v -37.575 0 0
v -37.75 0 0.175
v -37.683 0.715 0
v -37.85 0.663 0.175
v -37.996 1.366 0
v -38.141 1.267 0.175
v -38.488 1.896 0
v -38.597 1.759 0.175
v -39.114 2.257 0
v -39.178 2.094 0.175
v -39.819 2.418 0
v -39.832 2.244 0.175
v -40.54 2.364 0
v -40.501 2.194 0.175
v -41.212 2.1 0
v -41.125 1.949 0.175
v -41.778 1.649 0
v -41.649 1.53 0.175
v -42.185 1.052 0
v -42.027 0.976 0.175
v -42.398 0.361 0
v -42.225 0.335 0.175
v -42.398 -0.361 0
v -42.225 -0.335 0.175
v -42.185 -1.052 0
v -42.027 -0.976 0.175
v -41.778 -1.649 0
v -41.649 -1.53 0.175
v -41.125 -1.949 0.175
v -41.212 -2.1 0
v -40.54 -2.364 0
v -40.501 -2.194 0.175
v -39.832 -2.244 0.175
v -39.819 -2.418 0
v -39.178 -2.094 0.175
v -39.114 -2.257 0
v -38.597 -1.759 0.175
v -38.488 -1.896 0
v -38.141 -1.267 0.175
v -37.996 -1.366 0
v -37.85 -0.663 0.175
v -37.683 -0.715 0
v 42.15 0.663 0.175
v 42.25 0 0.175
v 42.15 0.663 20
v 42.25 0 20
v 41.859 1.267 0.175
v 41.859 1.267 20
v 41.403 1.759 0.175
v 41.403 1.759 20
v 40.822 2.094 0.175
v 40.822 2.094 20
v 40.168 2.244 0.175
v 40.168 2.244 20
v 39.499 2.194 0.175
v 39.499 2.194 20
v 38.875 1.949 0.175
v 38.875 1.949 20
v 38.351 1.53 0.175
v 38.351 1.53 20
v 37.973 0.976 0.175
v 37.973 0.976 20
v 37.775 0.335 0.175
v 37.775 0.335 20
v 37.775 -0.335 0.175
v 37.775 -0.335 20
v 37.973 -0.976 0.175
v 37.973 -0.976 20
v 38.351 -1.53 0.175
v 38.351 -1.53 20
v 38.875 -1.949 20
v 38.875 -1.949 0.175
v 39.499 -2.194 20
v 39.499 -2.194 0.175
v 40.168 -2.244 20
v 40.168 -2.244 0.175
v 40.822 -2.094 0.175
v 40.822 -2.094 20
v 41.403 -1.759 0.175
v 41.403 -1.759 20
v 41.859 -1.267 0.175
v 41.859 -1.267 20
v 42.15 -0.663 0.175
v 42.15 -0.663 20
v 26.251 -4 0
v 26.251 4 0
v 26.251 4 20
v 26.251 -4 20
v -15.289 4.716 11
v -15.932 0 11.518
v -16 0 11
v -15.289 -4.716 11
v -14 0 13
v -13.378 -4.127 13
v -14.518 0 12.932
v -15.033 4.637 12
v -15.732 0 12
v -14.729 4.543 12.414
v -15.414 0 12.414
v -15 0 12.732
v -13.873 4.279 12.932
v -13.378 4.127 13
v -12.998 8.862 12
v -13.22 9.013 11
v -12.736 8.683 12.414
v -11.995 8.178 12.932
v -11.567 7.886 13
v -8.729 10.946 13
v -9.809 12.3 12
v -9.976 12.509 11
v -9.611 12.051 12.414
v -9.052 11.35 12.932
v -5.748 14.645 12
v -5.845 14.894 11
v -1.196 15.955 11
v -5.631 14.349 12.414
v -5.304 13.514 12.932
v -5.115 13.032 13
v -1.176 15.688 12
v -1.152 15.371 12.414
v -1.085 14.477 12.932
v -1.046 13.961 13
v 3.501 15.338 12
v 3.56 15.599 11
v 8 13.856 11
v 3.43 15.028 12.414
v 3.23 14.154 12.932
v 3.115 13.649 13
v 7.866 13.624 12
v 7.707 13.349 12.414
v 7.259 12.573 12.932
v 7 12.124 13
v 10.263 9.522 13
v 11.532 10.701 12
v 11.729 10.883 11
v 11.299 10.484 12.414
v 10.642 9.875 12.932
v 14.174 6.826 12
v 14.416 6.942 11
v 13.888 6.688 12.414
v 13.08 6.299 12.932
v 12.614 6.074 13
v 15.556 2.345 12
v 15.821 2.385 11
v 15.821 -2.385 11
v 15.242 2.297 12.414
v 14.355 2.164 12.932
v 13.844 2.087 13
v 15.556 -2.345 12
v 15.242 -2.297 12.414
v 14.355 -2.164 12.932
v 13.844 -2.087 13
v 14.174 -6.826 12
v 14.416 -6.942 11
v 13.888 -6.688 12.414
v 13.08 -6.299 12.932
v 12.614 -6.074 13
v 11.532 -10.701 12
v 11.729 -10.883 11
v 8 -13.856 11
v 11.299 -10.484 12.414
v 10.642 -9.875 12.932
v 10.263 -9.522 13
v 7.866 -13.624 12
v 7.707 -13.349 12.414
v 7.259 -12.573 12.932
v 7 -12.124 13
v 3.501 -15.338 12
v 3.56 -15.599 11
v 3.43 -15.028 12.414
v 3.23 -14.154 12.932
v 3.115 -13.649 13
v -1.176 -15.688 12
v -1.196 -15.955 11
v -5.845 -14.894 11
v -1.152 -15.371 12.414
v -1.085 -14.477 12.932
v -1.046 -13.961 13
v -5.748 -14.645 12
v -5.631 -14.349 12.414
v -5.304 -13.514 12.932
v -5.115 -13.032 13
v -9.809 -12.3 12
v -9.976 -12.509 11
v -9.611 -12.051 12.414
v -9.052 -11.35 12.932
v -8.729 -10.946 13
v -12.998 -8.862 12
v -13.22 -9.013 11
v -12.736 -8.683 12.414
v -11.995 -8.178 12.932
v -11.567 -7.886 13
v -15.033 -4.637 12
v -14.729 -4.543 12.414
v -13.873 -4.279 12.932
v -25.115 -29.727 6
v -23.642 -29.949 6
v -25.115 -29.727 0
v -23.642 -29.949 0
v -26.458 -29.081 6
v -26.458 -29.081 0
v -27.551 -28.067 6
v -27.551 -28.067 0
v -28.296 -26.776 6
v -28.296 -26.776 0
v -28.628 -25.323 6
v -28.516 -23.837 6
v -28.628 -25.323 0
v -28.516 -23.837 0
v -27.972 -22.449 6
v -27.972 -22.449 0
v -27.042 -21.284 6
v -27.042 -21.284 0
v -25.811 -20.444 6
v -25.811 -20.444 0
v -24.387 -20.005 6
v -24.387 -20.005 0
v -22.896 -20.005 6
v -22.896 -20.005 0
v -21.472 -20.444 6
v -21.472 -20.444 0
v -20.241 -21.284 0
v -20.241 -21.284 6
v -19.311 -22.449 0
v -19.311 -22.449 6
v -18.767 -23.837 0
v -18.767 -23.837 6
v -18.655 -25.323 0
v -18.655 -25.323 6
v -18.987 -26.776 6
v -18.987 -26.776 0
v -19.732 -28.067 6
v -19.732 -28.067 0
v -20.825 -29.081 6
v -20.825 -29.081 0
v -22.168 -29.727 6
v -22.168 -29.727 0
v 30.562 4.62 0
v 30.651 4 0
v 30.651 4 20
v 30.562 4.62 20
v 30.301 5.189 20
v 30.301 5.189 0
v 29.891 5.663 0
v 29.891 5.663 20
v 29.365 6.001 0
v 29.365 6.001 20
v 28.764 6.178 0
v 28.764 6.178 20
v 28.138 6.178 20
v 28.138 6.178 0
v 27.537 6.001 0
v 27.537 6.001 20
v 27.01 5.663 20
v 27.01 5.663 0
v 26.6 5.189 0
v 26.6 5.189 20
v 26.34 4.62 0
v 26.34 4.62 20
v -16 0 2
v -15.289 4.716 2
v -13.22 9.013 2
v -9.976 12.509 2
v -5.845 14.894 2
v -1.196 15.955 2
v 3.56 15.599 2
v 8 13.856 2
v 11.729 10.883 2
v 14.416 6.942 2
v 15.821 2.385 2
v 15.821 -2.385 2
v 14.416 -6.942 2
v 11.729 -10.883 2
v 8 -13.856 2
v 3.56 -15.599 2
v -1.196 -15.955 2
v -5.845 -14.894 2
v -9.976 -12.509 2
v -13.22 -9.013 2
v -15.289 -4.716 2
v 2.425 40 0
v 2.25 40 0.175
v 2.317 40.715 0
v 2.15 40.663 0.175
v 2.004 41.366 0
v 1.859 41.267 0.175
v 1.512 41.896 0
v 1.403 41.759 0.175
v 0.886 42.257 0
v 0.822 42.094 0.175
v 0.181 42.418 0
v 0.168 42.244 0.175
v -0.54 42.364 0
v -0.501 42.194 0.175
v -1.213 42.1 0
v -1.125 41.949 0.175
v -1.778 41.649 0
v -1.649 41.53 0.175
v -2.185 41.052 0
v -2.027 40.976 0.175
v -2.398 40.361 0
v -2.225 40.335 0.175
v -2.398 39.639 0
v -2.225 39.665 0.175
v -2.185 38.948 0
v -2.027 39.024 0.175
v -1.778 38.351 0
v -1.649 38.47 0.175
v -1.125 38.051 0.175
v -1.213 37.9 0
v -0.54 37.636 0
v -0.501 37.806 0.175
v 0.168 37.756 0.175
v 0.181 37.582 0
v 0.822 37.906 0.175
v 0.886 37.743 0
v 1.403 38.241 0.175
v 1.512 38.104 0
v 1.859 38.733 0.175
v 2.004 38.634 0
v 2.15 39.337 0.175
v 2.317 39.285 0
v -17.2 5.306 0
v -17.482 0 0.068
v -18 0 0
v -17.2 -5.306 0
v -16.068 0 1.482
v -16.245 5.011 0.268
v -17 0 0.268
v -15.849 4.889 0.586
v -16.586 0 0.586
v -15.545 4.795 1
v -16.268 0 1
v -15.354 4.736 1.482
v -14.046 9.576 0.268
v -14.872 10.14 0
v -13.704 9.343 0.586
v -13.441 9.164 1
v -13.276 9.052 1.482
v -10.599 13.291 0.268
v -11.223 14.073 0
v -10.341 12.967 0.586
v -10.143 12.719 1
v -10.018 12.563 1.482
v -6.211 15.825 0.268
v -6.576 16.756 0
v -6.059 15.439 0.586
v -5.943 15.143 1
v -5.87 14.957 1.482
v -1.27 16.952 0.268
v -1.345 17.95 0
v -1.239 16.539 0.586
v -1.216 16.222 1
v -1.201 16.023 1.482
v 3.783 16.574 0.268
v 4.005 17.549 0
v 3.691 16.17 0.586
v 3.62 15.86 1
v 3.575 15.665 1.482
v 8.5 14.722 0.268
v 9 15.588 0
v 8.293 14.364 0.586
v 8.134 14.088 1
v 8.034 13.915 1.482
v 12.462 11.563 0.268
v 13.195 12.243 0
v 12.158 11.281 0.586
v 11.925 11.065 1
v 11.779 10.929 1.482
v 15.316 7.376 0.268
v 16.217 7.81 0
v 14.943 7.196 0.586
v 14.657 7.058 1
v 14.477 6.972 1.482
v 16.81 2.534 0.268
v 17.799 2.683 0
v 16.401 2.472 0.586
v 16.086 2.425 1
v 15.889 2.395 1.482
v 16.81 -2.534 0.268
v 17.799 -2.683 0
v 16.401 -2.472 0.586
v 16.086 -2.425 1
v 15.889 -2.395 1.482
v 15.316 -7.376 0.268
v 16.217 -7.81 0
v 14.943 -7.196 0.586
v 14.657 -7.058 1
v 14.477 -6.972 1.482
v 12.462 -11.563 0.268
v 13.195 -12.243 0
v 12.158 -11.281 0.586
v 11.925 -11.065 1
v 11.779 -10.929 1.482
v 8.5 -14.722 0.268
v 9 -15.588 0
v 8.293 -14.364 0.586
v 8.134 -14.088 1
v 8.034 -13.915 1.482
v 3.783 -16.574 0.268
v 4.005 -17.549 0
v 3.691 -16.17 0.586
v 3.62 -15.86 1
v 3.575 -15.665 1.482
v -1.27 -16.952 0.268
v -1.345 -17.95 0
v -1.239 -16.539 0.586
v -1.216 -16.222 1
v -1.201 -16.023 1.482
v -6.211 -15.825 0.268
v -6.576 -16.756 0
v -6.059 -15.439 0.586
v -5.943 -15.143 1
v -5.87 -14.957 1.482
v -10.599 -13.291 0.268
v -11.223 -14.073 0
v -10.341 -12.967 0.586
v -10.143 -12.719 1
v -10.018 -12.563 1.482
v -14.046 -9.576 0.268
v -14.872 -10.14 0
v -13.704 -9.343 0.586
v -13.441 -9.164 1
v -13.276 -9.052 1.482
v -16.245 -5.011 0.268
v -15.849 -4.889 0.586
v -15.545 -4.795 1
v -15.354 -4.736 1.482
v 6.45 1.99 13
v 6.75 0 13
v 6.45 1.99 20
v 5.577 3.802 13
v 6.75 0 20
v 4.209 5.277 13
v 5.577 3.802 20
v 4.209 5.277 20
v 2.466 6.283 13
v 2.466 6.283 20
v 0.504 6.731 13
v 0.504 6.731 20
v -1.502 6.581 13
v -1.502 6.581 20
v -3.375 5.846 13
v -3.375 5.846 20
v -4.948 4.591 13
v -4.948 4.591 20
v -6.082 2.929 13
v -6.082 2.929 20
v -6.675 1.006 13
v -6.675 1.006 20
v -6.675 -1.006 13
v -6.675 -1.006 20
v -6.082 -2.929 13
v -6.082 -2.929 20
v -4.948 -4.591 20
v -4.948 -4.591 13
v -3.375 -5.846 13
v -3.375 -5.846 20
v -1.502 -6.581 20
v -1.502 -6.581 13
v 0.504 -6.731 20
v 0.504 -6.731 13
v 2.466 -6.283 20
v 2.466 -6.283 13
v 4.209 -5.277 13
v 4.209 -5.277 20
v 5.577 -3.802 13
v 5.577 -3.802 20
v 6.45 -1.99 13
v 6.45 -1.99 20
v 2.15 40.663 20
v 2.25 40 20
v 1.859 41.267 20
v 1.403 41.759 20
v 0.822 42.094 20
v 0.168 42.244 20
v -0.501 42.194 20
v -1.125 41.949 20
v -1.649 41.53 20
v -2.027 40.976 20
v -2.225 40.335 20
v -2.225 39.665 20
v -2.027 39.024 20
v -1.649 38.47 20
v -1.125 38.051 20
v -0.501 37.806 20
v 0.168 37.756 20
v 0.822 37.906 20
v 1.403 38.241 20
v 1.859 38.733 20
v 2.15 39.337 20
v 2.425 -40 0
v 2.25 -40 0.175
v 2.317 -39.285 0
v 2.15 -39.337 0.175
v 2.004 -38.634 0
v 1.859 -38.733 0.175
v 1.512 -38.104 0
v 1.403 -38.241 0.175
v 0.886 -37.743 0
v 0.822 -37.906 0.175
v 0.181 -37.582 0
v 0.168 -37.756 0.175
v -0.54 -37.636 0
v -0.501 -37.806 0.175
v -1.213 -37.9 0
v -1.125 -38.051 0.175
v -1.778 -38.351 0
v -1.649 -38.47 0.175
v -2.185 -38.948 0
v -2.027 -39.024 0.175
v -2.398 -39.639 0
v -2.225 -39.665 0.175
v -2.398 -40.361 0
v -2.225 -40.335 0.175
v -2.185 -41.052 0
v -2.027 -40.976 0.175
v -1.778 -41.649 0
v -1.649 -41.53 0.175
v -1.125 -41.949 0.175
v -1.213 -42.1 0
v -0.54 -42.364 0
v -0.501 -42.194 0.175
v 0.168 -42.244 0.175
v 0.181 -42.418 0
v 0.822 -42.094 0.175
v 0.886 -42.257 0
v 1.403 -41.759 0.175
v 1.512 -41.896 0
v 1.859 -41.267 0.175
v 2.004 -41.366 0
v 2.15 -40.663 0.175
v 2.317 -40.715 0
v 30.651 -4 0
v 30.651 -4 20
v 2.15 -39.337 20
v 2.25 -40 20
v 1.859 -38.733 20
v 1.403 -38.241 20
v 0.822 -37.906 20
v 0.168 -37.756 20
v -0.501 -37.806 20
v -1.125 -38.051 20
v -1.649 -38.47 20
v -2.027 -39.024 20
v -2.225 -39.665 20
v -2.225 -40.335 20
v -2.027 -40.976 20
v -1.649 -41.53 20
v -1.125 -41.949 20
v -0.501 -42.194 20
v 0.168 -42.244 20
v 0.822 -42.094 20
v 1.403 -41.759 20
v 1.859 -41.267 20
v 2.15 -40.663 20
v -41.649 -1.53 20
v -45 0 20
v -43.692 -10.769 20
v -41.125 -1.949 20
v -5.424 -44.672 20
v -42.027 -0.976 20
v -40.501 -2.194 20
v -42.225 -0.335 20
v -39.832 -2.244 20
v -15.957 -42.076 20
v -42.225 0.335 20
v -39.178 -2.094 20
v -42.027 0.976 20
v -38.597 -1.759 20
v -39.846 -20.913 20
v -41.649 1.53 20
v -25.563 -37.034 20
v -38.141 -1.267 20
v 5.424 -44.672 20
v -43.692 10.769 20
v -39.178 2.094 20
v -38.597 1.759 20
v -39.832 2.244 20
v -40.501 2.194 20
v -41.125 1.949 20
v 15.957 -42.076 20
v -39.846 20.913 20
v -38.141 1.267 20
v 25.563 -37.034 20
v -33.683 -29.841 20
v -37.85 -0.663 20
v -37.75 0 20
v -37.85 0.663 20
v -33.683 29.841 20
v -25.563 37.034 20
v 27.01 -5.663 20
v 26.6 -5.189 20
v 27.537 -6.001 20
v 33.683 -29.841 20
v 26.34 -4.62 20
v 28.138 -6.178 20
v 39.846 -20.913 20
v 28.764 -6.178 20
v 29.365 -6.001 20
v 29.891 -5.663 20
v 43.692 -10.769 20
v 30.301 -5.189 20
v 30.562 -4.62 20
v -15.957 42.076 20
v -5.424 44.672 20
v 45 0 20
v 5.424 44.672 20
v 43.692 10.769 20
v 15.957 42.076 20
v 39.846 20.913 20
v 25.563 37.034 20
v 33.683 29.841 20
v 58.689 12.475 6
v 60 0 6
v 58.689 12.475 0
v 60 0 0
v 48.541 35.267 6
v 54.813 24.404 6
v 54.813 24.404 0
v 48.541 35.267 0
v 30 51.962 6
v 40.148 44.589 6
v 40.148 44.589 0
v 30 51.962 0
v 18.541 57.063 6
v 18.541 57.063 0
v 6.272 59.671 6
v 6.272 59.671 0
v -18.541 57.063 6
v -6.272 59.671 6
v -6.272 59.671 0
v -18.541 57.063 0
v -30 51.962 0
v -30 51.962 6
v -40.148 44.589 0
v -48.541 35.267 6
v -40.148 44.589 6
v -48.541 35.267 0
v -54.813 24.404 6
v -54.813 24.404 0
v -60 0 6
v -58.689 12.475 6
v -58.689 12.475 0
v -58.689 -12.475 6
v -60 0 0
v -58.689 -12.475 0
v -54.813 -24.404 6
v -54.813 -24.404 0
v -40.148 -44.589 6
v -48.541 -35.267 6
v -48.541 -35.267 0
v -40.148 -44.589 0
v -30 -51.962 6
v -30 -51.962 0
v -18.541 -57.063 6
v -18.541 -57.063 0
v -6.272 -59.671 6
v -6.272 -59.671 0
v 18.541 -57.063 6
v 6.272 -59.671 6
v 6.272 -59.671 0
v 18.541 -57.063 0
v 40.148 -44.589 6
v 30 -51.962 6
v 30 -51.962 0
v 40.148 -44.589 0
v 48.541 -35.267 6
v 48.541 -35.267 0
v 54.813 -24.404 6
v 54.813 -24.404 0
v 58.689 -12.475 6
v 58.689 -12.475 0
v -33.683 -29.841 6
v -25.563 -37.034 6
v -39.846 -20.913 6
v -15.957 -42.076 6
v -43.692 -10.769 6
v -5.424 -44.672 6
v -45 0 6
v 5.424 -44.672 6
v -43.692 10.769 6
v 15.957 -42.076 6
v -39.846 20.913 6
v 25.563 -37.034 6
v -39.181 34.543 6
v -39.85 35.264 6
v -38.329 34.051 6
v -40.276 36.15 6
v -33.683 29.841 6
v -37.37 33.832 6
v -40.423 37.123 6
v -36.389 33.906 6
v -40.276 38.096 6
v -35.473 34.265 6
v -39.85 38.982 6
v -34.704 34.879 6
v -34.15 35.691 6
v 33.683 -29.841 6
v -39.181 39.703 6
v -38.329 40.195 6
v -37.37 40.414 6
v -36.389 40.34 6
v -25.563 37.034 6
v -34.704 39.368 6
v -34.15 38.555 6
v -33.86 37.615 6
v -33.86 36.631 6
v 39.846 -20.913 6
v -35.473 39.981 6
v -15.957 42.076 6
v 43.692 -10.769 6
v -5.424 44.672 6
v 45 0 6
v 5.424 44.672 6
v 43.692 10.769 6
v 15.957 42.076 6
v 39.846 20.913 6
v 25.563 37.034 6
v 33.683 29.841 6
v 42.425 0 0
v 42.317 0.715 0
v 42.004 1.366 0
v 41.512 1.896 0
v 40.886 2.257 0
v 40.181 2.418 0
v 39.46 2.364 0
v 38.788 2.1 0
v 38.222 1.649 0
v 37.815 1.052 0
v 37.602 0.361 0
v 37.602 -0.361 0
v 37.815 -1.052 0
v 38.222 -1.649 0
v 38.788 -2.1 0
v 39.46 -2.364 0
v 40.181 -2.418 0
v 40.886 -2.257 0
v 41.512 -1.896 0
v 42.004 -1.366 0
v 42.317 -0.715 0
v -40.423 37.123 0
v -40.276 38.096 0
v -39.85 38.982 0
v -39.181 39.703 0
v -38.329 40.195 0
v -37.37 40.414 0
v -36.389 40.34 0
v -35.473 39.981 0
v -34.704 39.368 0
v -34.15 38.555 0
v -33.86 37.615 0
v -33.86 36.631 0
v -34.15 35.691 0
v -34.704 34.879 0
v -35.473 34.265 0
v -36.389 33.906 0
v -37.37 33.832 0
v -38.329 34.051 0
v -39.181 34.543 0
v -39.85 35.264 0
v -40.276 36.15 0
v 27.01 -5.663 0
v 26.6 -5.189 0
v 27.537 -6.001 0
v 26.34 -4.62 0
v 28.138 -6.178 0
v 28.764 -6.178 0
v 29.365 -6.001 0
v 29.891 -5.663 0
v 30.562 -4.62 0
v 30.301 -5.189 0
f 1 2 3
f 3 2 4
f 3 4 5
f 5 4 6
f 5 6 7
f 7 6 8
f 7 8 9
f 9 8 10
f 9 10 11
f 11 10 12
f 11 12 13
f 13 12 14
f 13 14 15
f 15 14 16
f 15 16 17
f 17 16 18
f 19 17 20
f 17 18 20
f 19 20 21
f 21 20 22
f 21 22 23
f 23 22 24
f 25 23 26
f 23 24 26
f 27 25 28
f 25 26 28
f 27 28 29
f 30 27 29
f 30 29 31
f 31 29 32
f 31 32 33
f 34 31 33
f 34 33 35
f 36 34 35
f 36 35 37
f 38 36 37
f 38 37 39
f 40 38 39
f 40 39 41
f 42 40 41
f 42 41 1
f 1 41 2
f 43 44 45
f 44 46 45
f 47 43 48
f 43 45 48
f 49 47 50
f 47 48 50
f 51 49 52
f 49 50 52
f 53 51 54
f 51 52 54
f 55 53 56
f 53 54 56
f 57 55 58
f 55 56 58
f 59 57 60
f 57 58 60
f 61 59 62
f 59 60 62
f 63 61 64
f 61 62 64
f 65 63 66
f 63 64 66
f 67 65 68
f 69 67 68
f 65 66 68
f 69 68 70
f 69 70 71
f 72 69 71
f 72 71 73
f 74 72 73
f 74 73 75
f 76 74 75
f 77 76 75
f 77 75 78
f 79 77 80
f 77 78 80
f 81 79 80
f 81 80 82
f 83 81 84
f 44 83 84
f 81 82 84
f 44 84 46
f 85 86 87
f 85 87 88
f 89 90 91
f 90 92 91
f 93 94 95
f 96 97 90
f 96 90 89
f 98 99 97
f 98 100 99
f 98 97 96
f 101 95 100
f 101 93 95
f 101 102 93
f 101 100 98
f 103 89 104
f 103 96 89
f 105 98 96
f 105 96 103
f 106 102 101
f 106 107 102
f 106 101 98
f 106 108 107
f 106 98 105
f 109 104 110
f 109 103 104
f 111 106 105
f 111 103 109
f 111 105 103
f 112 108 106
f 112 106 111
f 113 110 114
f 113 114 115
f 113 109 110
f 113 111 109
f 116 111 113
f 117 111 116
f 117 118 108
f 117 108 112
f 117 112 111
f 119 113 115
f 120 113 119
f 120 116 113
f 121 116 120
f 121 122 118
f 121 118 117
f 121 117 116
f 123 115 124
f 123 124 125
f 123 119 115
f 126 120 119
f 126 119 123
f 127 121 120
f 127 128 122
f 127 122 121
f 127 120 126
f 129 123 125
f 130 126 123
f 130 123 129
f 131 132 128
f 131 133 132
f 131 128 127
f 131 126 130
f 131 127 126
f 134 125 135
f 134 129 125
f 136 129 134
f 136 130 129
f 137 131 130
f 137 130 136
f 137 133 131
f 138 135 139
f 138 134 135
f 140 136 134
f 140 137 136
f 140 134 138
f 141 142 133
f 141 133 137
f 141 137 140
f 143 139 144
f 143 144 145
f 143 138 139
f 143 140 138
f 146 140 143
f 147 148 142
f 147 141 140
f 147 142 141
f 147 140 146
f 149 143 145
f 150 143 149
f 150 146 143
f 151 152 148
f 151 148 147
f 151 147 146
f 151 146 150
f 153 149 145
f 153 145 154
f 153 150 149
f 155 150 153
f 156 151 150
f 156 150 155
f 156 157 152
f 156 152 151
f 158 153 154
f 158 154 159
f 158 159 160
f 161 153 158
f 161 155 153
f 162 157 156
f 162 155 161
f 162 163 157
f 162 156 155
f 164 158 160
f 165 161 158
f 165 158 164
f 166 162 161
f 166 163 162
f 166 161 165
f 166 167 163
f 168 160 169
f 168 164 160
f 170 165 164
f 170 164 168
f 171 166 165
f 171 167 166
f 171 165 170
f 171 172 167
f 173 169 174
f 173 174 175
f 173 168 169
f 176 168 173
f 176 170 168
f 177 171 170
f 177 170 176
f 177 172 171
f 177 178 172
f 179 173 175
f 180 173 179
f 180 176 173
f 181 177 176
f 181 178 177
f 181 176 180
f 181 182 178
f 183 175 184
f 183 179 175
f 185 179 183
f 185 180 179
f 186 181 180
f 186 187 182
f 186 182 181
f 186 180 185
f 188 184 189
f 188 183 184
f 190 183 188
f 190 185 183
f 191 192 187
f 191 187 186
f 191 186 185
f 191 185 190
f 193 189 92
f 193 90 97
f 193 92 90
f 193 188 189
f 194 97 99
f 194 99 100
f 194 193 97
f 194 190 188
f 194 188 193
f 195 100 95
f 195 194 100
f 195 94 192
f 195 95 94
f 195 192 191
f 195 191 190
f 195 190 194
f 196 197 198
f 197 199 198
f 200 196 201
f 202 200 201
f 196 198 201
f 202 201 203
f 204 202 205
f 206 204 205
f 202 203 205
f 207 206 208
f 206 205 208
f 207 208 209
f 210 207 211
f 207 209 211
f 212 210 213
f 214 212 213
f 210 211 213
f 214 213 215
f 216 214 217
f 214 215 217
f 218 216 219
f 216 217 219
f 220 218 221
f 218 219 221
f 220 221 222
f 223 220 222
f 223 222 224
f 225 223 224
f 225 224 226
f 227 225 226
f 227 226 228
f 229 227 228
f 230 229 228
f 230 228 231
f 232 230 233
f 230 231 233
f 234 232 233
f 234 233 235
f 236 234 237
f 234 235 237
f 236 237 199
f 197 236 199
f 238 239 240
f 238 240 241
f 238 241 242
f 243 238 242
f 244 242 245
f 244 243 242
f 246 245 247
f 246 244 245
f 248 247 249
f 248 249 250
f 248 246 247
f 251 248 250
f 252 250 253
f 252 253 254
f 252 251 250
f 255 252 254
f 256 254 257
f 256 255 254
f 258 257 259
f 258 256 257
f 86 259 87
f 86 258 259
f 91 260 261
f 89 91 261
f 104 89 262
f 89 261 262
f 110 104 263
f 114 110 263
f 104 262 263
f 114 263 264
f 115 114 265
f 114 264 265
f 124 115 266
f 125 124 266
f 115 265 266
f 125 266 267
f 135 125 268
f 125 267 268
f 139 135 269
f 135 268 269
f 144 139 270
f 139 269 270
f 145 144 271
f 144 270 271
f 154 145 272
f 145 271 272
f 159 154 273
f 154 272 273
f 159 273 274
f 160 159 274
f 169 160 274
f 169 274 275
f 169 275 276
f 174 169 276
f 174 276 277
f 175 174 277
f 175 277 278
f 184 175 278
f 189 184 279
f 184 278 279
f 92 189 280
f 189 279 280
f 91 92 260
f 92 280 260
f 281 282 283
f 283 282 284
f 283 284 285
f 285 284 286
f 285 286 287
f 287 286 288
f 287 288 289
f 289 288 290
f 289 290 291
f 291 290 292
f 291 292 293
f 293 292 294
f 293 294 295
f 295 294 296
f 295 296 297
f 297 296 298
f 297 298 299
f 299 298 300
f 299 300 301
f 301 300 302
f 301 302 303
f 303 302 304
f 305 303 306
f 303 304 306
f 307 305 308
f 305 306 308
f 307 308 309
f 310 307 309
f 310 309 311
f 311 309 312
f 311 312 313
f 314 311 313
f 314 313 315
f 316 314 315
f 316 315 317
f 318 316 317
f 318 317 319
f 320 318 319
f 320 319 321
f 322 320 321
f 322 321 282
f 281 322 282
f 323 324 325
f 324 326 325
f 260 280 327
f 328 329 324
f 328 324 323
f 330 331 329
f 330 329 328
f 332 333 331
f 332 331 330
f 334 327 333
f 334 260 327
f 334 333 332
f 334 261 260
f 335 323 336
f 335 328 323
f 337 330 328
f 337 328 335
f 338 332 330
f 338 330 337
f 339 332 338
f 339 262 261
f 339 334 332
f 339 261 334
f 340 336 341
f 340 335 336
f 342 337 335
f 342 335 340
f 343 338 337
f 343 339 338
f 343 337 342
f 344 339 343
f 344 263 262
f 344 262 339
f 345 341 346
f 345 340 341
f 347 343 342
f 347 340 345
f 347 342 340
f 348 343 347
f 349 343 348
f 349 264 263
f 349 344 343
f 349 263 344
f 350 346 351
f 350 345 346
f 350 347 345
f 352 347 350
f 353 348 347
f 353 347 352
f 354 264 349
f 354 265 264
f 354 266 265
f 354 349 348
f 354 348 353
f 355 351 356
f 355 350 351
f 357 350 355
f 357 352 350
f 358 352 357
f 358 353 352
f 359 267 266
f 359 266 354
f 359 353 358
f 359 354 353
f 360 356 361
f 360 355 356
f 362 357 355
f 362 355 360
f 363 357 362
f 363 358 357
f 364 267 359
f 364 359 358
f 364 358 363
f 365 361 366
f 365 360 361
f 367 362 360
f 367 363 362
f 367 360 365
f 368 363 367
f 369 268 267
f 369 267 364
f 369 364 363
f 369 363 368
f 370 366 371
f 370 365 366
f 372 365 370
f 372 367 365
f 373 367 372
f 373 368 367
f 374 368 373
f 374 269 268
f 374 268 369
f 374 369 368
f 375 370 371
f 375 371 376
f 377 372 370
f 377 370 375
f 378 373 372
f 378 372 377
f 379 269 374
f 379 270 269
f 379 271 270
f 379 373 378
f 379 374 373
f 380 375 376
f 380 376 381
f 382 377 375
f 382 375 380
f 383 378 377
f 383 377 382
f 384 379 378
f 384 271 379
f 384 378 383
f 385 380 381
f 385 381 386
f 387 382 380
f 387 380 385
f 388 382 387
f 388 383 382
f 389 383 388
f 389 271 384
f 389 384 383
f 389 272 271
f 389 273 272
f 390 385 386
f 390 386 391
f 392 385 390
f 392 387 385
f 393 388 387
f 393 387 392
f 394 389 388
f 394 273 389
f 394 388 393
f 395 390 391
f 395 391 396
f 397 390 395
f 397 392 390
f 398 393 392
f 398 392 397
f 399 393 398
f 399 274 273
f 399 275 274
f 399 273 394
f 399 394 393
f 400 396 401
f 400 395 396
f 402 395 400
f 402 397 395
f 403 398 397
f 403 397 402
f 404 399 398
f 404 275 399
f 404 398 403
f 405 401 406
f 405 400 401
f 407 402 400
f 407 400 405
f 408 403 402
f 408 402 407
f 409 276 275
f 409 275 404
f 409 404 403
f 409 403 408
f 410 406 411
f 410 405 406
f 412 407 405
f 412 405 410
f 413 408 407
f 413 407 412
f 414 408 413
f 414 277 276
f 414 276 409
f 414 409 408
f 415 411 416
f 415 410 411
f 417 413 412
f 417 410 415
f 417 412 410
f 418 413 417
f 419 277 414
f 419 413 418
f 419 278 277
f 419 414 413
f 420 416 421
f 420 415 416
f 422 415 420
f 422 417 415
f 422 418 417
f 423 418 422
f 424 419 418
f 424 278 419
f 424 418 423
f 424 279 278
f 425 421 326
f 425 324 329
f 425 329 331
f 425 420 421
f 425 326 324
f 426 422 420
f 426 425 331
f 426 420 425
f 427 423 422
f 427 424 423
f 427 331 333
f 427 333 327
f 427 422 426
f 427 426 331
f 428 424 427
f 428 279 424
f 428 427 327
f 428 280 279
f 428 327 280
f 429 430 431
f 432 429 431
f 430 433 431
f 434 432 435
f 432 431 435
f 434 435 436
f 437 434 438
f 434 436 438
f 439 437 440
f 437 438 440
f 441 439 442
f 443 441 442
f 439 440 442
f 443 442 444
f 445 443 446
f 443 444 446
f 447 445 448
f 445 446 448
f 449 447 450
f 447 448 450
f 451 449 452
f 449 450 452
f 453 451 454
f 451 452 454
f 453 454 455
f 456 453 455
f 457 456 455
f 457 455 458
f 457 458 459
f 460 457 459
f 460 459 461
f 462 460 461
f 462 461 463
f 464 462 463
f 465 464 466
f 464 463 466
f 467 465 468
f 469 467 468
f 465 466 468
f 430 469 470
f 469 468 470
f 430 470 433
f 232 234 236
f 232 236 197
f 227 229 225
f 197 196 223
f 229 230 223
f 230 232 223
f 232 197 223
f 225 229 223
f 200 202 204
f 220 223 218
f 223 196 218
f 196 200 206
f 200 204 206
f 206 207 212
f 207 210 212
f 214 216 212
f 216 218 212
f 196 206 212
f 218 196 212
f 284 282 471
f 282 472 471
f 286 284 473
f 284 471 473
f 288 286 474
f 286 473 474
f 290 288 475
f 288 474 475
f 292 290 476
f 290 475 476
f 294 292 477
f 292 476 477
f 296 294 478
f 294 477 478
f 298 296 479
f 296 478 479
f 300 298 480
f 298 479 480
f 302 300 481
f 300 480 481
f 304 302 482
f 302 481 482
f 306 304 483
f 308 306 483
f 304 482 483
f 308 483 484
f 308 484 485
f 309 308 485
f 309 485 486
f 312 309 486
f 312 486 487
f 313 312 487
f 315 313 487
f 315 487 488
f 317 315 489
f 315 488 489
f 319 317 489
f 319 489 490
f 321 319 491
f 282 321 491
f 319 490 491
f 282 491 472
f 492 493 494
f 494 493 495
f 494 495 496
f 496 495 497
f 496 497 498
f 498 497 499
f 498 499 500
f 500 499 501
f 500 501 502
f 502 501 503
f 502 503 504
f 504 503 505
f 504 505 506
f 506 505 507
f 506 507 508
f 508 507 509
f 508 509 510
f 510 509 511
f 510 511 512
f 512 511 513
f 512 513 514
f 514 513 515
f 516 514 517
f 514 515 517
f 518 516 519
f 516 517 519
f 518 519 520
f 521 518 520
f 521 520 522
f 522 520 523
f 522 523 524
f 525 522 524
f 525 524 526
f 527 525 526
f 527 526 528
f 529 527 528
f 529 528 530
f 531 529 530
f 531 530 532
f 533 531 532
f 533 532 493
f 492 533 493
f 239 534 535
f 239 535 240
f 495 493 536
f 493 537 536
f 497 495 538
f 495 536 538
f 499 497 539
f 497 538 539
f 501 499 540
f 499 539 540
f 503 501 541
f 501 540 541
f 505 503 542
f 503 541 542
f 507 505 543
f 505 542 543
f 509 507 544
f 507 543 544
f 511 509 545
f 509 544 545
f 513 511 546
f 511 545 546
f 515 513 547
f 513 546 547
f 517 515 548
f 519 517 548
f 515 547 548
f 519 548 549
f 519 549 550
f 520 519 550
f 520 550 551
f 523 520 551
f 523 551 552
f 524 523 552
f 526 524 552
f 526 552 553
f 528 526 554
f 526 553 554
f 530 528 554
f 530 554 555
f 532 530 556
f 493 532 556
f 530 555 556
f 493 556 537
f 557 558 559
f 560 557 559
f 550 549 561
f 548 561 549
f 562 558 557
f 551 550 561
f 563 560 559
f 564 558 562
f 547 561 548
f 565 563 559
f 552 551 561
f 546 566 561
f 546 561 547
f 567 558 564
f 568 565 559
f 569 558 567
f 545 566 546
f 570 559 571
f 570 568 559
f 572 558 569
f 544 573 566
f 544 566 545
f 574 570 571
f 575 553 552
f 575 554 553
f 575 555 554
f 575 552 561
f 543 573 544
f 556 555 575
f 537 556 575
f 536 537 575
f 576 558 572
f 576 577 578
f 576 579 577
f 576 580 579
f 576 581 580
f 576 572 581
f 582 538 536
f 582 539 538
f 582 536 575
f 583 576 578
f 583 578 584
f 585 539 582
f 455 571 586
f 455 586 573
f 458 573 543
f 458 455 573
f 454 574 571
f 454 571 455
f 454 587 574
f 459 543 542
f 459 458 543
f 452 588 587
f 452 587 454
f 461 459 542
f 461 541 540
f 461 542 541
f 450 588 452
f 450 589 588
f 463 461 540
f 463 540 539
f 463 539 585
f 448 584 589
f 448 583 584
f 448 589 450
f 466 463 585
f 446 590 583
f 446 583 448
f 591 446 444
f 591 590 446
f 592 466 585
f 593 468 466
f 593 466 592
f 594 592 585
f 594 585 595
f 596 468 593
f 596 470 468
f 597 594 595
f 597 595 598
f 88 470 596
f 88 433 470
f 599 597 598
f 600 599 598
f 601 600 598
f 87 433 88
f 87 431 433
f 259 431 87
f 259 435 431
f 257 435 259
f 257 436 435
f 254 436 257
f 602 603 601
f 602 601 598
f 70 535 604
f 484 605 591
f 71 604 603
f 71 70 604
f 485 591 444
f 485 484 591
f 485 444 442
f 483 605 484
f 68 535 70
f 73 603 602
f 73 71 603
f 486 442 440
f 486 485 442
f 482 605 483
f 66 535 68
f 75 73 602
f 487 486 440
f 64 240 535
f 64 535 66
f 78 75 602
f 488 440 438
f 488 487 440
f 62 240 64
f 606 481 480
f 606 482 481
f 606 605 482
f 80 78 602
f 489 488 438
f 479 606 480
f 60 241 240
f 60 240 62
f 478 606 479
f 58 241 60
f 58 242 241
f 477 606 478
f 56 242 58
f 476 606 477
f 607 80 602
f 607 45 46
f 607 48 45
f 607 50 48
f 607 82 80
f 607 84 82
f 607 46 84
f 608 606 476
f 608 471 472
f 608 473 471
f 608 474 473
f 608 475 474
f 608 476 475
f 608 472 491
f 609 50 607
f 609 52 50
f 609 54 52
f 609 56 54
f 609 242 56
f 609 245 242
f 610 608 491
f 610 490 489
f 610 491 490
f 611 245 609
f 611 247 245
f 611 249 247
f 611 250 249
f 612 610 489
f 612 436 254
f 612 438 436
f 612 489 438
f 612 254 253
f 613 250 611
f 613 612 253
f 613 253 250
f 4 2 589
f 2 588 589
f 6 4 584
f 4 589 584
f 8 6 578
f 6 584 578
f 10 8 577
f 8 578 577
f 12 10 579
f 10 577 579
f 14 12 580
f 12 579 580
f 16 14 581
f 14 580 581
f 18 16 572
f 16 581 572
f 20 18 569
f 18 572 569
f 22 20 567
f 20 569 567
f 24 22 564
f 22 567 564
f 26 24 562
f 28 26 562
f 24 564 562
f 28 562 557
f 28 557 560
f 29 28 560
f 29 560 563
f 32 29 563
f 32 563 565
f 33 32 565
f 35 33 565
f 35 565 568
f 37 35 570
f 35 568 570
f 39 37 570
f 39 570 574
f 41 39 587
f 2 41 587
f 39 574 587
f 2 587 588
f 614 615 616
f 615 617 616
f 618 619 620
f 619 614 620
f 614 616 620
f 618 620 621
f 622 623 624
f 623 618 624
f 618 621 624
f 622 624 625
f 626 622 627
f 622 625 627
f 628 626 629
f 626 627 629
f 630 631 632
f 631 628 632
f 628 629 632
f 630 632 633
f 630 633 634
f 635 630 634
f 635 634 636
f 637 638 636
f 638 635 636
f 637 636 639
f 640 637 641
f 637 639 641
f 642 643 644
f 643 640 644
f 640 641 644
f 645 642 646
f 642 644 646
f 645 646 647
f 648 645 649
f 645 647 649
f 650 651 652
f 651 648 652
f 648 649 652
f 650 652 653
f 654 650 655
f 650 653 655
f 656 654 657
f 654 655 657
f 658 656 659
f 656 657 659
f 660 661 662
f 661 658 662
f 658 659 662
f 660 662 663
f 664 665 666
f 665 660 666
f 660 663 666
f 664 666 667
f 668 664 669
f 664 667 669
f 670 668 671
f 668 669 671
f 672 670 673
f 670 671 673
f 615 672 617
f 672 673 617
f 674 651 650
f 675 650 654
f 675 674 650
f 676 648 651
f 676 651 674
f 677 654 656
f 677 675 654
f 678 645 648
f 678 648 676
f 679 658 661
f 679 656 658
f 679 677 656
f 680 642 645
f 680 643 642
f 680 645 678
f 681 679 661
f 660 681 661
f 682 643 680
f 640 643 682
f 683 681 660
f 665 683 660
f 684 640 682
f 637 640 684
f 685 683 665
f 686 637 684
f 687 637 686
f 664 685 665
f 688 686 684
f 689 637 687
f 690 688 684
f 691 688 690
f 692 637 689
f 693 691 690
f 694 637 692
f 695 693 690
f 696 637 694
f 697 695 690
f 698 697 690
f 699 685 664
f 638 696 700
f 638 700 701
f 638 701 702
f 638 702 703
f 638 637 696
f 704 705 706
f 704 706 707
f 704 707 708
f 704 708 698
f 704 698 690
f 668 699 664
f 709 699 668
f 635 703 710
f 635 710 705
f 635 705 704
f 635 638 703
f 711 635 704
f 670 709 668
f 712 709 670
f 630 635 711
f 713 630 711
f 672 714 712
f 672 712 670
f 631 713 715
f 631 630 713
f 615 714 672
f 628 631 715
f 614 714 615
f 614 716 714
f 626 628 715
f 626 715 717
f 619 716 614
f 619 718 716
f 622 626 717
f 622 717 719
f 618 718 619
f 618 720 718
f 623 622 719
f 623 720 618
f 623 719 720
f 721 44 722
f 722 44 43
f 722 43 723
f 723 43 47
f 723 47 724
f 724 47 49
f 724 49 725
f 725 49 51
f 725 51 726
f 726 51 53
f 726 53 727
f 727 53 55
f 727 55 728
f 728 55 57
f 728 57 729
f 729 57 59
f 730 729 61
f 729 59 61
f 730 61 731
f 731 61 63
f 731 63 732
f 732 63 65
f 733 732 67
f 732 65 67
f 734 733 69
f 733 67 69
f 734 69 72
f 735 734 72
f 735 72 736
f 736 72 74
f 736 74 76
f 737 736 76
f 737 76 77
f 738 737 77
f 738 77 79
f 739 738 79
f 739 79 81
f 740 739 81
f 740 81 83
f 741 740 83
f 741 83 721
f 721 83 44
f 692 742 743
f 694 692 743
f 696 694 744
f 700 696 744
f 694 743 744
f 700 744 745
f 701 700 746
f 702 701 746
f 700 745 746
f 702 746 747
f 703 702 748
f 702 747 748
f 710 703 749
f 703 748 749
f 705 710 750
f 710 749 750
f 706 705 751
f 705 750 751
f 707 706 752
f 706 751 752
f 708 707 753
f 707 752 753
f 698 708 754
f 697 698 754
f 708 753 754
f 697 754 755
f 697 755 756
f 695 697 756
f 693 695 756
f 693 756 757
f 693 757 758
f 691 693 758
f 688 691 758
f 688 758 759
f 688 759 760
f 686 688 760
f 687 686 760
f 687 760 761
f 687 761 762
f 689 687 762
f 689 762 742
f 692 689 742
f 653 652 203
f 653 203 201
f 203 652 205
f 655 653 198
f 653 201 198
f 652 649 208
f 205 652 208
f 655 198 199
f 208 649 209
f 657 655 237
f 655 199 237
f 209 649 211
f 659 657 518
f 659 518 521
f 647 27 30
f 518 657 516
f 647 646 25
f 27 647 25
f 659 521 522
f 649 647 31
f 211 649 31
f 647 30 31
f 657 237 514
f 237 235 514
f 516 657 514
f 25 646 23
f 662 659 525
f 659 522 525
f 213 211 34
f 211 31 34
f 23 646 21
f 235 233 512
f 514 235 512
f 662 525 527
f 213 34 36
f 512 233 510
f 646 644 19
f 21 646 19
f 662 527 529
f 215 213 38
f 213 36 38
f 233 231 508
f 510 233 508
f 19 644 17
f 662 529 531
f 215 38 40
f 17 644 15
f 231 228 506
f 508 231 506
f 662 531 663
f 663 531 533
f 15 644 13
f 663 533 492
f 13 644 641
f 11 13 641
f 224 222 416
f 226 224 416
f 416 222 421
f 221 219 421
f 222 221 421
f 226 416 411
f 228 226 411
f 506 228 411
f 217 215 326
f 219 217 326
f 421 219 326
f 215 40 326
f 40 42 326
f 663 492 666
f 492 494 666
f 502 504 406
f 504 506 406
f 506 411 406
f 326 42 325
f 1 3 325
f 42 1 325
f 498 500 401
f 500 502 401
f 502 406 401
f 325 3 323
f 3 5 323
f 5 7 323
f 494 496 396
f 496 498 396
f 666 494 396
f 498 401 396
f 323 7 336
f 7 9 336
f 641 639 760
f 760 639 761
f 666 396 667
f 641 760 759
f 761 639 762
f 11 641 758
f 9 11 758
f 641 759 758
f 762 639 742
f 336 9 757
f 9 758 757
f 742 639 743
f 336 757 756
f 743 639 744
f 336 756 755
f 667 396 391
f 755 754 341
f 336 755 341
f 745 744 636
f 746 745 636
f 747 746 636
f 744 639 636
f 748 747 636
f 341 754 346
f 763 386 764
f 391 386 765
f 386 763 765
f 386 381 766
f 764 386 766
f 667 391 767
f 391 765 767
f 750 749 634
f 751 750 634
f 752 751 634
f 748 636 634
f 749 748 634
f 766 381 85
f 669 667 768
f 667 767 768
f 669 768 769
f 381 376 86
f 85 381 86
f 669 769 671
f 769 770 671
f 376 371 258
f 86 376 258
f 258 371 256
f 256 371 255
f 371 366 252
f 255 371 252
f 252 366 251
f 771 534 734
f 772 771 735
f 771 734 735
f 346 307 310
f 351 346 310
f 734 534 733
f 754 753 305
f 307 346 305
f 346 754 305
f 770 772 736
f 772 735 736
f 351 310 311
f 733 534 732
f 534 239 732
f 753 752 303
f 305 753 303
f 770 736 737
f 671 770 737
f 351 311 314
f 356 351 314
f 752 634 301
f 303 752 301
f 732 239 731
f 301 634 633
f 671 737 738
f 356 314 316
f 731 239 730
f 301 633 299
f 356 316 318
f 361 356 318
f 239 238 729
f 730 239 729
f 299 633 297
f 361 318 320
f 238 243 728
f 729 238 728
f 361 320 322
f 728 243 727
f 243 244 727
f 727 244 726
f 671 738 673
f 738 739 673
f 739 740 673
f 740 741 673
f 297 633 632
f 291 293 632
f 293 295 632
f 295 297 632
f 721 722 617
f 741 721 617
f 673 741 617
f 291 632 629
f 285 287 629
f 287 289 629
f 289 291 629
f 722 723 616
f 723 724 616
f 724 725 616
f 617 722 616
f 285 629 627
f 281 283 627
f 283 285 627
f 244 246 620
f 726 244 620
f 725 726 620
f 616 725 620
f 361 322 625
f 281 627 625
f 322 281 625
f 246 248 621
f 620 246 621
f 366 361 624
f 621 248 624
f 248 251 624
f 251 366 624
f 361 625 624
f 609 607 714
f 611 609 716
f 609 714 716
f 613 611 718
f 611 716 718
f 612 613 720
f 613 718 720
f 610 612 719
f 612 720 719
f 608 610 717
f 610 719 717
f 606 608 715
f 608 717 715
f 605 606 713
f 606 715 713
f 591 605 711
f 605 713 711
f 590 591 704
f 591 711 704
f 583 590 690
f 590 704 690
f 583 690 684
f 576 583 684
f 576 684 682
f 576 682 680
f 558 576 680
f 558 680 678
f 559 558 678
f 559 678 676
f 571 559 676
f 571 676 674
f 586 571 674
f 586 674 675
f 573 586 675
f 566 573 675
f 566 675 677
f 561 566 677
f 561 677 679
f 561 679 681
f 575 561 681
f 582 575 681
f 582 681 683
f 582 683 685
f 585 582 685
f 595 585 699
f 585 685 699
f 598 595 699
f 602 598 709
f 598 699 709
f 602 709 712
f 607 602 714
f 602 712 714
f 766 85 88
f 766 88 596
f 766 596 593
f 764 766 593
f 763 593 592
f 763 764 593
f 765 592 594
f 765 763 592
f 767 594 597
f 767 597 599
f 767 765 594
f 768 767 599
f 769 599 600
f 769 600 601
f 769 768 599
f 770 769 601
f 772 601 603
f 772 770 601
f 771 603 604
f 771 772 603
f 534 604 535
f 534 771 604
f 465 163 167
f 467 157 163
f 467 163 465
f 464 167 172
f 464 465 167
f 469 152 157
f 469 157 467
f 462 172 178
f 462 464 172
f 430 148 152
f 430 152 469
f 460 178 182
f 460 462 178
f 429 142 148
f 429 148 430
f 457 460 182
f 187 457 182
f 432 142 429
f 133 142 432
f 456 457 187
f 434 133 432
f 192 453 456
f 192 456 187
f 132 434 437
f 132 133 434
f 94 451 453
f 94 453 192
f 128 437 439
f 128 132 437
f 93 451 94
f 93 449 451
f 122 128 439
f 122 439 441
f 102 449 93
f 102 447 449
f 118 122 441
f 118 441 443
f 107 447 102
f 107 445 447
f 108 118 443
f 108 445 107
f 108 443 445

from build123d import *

# Parameters (mm, degrees)
ESQUISSE1_R                         = 60
CYLINDRE_PRINCIPAL_DEPTH            = 6
BOSSAGE_RV_R                        = 45
LOGEMENT_RV_DEPTH                   = 20
ESQUISSE20_R                        = 7.5
BOSS_EXTRU_2_DEPTH                  = 6
TROUS_AV_D                          = 4.5
TROUS_AV_CSINK_D                    = 4.85
TROUS_AV_CSINK_ANGLE                = 90
DIAM_TRE_DU_PER_AGE_4_4_4_4_2_DEPTH = 20
D_AGEMENT_SM_D                      = 6.6
TROU_RECOVERY_D                     = 13.5
TROU_RECOVERY_CSINK_D               = 13.55
TROU_RECOVERY_CSINK_ANGLE           = 90
ESQUISSE40_R                        = 16
ENL_V_MAT_EXTRU_2_DEPTH             = 13
CONG_9_R                            = 2
ESQUISSE15_W                        = 5
ESQUISSE15_H                        = 6
CONG_10_R                           = 2


# Read off the part's stored shape, not the designer's step: Diamètre du perçage Ø4.4 (4.4)2
with BuildPart() as part:
    # Esquisse1 → Cylindre principal (new body)
    with BuildSketch(Plane.XY):
        Circle(ESQUISSE1_R)
    extrude(amount=CYLINDRE_PRINCIPAL_DEPTH)

    # Bossage RV → Logement RV (add)
    with BuildSketch(Plane.XY):
        Circle(BOSSAGE_RV_R)
    extrude(amount=LOGEMENT_RV_DEPTH)

    # Esquisse20 → Boss.-Extru.2 (add)
    with BuildSketch(Plane.XY):
        with Locations((-37.123106012, 37.123106012)):
            Circle(ESQUISSE20_R)
    extrude(amount=BOSS_EXTRU_2_DEPTH)

    # Trous AV (through all)
    with Locations(Plane(origin=(0, 40, 0), x_dir=(-1, 0, 0), z_dir=(0, 0, -1))):
        with Locations((0, 0), (40, -40), (0, -80), (-40, -40)):
            CounterSinkHole(TROUS_AV_D / 2, TROUS_AV_CSINK_D / 2, counter_sink_angle=TROUS_AV_CSINK_ANGLE)

    # Diamètre du perçage Ø4.4 (4.4)2 outline → Diamètre du perçage Ø4.4 (4.4)2 (cut)
    with BuildSketch(Plane.XY):
        with BuildLine():
            ThreePointArc((30.65064108, 4), (28.45064108, 6.2), (26.25064108, 4))
            Line((26.25064108, 4), (26.25064108, -4))
            ThreePointArc((26.25064108, -4), (28.45064108, -6.2), (30.65064108, -4))
            Line((30.65064108, -4), (30.65064108, 4))
        make_face()
    extrude(amount=DIAM_TRE_DU_PER_AGE_4_4_4_4_2_DEPTH, mode=Mode.SUBTRACT)

    # Déagement SM (through all)
    with Locations(Plane.XY.offset(6)):
        with Locations((-37.123106012, 37.123106012)):
            Hole(D_AGEMENT_SM_D / 2)

    # Trou recovery (through all)
    with Locations(Plane(origin=(0, 0, 0), x_dir=(-1, 0, 0), z_dir=(0, 0, -1))):
        with Locations((0, 0)):
            CounterSinkHole(TROU_RECOVERY_D / 2, TROU_RECOVERY_CSINK_D / 2, counter_sink_angle=TROU_RECOVERY_CSINK_ANGLE)

    # Esquisse40 → Enlèv. mat.-Extru.2 (cut)
    with BuildSketch(Plane(origin=(0, 0, 0), x_dir=(-1, 0, 0), z_dir=(0, 0, -1))):
        Circle(ESQUISSE40_R)
    extrude(amount=-ENL_V_MAT_EXTRU_2_DEPTH, mode=Mode.SUBTRACT)

    # Congé9
    cong_9_edges = [part.edges().sort_by_distance(p)[0] for p in [
        (16, 0, 0),
    ]]
    fillet(cong_9_edges, radius=CONG_9_R)

    # Esquisse15 → Trou caméra (revolve, cut)
    with BuildSketch(Plane(origin=(-23.641512829, -24.949340174, 6), x_dir=(0, -1, 0), z_dir=(1, 0, 0))):
        with Locations((2.5, 3)):
            Rectangle(ESQUISSE15_W, ESQUISSE15_H)
    revolve(axis=Axis((-23.641512829, -24.949340174, 12.35), (0, 0, -1)), mode=Mode.SUBTRACT)

    # Congé10
    cong_10_edges = [part.edges().sort_by_distance(p)[0] for p in [
        (16, 0, 13),
    ]]
    fillet(cong_10_edges, radius=CONG_10_R)


solid = part.part
